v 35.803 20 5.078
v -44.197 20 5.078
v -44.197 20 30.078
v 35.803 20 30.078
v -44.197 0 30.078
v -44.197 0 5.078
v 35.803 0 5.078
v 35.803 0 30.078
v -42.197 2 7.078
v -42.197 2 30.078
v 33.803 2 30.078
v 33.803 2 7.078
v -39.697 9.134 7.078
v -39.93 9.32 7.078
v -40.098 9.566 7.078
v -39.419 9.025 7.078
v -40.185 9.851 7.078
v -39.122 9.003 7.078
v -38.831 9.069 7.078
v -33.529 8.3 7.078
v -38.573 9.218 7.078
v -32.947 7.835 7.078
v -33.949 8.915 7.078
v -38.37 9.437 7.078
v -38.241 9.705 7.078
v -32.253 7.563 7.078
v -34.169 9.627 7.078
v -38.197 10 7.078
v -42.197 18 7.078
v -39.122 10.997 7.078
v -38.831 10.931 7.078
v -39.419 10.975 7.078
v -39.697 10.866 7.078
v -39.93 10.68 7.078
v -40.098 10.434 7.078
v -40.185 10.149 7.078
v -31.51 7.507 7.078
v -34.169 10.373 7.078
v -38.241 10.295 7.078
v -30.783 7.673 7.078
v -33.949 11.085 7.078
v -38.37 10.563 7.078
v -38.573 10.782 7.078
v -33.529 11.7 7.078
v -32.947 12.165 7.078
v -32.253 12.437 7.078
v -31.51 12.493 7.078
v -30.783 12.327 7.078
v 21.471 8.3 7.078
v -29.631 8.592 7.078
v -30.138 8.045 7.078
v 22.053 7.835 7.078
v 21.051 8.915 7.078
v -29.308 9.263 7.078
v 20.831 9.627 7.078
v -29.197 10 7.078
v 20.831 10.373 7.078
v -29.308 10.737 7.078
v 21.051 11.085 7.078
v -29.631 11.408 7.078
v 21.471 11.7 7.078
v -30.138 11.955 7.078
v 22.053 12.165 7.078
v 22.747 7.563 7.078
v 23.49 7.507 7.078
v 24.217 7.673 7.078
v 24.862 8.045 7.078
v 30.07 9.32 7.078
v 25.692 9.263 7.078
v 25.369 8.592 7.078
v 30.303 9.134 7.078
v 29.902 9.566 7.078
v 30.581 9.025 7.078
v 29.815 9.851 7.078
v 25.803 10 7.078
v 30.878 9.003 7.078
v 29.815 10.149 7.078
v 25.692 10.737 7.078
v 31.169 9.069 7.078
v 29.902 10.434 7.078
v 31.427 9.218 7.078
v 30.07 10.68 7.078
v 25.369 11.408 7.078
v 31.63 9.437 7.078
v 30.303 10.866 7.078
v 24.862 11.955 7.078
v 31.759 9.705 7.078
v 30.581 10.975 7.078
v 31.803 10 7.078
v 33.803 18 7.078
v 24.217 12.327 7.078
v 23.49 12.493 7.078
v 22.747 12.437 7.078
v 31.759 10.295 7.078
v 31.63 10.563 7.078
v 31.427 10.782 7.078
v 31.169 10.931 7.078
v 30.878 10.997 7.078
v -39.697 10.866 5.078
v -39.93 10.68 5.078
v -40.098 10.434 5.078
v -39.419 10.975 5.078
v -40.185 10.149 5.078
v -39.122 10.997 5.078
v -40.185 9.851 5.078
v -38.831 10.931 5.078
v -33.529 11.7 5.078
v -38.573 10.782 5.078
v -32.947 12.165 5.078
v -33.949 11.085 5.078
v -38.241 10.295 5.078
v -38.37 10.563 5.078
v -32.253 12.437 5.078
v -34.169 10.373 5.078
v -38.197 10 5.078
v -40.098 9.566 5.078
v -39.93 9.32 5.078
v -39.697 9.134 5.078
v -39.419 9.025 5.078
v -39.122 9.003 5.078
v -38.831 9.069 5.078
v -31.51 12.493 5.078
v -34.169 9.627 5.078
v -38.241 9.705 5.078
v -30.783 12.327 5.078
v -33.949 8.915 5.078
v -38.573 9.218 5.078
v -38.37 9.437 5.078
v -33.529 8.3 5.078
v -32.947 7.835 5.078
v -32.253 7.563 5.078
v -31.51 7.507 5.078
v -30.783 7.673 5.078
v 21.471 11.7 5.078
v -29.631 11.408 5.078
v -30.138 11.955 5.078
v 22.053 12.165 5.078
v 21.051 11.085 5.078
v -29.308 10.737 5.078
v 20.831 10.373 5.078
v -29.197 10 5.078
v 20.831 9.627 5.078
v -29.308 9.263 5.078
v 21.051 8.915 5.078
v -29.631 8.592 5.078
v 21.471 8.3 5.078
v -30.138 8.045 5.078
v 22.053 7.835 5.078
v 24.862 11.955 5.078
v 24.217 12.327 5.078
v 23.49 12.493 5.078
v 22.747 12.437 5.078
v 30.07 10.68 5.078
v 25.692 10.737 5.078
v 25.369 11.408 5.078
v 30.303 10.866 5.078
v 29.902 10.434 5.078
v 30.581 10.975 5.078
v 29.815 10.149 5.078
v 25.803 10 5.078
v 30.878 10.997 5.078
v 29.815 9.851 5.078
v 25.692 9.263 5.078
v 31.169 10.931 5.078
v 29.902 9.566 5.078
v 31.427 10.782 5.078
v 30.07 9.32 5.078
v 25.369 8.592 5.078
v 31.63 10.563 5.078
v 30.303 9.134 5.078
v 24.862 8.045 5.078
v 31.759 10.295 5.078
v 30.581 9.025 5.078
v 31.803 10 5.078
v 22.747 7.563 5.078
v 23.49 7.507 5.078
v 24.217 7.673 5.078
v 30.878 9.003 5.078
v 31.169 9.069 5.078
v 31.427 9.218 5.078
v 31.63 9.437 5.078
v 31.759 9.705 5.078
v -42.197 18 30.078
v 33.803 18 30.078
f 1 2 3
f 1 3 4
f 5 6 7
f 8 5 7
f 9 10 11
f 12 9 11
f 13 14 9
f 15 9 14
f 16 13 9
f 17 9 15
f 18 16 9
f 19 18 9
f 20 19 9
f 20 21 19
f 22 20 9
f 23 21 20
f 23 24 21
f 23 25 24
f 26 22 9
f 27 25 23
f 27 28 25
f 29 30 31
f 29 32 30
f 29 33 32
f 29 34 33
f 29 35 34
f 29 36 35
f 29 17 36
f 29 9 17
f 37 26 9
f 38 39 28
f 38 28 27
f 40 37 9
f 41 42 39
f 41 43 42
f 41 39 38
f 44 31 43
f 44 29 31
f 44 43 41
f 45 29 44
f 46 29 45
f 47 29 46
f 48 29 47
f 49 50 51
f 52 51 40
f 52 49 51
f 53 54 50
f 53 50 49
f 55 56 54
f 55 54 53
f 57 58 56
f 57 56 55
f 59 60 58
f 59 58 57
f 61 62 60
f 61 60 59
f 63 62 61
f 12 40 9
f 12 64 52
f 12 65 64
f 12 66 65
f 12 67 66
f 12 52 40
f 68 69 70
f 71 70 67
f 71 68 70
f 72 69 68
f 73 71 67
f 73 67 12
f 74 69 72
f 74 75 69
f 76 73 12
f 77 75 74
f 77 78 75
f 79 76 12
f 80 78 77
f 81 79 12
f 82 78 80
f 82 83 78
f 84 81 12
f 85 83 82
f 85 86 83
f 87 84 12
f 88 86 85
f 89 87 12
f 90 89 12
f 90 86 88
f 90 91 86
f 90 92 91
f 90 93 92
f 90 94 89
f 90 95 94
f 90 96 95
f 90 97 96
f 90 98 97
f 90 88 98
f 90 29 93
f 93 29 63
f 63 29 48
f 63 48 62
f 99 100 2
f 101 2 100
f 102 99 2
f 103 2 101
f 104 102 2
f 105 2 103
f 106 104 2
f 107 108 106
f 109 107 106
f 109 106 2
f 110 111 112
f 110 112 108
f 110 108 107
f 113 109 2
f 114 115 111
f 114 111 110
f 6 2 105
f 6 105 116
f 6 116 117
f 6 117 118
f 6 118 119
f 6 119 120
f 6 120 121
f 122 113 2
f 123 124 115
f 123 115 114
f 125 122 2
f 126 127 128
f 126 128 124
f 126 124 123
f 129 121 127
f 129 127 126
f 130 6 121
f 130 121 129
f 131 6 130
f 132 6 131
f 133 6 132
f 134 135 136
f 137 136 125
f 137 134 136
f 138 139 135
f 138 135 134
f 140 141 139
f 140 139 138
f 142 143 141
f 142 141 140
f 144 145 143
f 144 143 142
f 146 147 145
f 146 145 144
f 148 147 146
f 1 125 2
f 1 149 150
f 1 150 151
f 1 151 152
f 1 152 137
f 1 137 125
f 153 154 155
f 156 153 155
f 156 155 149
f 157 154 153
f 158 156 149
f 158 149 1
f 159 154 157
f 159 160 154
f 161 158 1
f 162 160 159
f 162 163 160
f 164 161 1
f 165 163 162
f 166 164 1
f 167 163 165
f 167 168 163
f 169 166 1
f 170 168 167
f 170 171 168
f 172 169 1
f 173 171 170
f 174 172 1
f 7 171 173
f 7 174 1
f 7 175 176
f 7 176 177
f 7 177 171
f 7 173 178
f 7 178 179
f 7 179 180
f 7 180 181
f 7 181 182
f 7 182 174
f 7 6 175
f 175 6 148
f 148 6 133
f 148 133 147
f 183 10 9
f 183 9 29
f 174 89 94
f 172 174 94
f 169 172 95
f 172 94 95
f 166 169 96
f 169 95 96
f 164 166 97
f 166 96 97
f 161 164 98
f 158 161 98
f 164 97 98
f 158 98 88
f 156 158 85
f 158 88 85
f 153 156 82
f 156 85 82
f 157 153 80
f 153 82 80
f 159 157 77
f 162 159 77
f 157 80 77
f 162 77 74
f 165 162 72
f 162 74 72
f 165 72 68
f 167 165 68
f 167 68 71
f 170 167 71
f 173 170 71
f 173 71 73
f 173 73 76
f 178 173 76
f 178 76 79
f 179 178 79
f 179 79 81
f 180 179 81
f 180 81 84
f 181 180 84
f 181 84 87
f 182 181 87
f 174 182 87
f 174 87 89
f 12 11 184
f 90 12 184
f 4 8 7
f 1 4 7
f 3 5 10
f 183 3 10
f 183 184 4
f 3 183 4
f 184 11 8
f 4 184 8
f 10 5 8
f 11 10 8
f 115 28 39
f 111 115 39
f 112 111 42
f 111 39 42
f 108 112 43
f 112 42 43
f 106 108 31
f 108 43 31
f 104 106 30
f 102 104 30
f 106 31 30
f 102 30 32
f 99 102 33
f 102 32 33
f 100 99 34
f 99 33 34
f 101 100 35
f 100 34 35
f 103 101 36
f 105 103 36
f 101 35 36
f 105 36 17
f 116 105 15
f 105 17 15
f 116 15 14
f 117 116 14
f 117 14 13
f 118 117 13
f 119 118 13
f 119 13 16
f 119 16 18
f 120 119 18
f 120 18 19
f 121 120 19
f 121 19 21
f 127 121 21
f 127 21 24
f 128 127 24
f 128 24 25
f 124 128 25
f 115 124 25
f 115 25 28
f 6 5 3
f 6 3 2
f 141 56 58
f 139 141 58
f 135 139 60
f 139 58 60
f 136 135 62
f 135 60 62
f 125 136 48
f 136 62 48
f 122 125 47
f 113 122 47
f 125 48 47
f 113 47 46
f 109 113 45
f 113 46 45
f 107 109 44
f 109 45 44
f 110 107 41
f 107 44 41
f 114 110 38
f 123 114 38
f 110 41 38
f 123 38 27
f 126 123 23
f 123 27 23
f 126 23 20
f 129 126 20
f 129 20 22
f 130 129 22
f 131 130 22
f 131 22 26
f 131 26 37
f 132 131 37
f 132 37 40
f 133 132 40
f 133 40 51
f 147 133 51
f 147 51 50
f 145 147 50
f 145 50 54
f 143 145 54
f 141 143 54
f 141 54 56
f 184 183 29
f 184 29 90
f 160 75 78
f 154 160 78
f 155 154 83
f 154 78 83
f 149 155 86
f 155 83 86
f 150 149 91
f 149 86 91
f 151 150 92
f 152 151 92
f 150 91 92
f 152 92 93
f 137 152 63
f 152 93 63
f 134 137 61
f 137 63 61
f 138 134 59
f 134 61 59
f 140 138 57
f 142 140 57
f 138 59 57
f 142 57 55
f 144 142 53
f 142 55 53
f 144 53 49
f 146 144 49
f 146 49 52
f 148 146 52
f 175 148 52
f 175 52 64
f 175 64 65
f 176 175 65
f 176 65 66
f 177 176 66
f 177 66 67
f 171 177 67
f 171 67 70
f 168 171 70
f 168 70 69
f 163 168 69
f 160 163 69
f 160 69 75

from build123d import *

# Parameters (mm, degrees)
SKETCH1_W           = 80
SKETCH1_H           = 25
BOSS_EXTRUDE1_DEPTH = 20
SKETCH3_W           = 76
SKETCH3_H           = 16
CUT_EXTRUDE1_DEPTH  = 23
SKETCH4_R           = 1
CUT_EXTRUDE2_DEPTH  = 48
SKETCH5_R           = 2.5
CUT_EXTRUDE3_DEPTH  = 48


with BuildPart() as part:
    # Sketch1 → Boss-Extrude1 (new body)
    with BuildSketch(Plane(origin=(0, 0, 0), x_dir=(1, 0, 0), z_dir=(0, 1, 0))):
        with Locations((-4.196598457, -17.578240617)):
            Rectangle(SKETCH1_W, SKETCH1_H)
    extrude(amount=BOSS_EXTRUDE1_DEPTH)

    # Sketch3 → Cut-Extrude1 (cut)
    with BuildSketch(Plane.XY.offset(30.078240617)):
        with Locations((-4.196598457, 10)):
            Rectangle(SKETCH3_W, SKETCH3_H)
    extrude(amount=-CUT_EXTRUDE1_DEPTH, mode=Mode.SUBTRACT)

    # Sketch4 → Cut-Extrude2 (cut)
    with BuildSketch(Plane.XY.offset(7.078240617)):
        with Locations((30.803401543, 10)):
            Circle(SKETCH4_R)
        with Locations((-39.196598457, 10)):
            Circle(SKETCH4_R)
    extrude(amount=-CUT_EXTRUDE2_DEPTH, mode=Mode.SUBTRACT)

    # Sketch5 → Cut-Extrude3 (cut)
    with BuildSketch(Plane.XY.offset(7.078240617)):
        with Locations((-31.696598457, 10)):
            Circle(SKETCH5_R)
        with Locations((23.303401543, 10)):
            Circle(SKETCH5_R)
    extrude(amount=-CUT_EXTRUDE3_DEPTH, mode=Mode.SUBTRACT)


solid = part.part
